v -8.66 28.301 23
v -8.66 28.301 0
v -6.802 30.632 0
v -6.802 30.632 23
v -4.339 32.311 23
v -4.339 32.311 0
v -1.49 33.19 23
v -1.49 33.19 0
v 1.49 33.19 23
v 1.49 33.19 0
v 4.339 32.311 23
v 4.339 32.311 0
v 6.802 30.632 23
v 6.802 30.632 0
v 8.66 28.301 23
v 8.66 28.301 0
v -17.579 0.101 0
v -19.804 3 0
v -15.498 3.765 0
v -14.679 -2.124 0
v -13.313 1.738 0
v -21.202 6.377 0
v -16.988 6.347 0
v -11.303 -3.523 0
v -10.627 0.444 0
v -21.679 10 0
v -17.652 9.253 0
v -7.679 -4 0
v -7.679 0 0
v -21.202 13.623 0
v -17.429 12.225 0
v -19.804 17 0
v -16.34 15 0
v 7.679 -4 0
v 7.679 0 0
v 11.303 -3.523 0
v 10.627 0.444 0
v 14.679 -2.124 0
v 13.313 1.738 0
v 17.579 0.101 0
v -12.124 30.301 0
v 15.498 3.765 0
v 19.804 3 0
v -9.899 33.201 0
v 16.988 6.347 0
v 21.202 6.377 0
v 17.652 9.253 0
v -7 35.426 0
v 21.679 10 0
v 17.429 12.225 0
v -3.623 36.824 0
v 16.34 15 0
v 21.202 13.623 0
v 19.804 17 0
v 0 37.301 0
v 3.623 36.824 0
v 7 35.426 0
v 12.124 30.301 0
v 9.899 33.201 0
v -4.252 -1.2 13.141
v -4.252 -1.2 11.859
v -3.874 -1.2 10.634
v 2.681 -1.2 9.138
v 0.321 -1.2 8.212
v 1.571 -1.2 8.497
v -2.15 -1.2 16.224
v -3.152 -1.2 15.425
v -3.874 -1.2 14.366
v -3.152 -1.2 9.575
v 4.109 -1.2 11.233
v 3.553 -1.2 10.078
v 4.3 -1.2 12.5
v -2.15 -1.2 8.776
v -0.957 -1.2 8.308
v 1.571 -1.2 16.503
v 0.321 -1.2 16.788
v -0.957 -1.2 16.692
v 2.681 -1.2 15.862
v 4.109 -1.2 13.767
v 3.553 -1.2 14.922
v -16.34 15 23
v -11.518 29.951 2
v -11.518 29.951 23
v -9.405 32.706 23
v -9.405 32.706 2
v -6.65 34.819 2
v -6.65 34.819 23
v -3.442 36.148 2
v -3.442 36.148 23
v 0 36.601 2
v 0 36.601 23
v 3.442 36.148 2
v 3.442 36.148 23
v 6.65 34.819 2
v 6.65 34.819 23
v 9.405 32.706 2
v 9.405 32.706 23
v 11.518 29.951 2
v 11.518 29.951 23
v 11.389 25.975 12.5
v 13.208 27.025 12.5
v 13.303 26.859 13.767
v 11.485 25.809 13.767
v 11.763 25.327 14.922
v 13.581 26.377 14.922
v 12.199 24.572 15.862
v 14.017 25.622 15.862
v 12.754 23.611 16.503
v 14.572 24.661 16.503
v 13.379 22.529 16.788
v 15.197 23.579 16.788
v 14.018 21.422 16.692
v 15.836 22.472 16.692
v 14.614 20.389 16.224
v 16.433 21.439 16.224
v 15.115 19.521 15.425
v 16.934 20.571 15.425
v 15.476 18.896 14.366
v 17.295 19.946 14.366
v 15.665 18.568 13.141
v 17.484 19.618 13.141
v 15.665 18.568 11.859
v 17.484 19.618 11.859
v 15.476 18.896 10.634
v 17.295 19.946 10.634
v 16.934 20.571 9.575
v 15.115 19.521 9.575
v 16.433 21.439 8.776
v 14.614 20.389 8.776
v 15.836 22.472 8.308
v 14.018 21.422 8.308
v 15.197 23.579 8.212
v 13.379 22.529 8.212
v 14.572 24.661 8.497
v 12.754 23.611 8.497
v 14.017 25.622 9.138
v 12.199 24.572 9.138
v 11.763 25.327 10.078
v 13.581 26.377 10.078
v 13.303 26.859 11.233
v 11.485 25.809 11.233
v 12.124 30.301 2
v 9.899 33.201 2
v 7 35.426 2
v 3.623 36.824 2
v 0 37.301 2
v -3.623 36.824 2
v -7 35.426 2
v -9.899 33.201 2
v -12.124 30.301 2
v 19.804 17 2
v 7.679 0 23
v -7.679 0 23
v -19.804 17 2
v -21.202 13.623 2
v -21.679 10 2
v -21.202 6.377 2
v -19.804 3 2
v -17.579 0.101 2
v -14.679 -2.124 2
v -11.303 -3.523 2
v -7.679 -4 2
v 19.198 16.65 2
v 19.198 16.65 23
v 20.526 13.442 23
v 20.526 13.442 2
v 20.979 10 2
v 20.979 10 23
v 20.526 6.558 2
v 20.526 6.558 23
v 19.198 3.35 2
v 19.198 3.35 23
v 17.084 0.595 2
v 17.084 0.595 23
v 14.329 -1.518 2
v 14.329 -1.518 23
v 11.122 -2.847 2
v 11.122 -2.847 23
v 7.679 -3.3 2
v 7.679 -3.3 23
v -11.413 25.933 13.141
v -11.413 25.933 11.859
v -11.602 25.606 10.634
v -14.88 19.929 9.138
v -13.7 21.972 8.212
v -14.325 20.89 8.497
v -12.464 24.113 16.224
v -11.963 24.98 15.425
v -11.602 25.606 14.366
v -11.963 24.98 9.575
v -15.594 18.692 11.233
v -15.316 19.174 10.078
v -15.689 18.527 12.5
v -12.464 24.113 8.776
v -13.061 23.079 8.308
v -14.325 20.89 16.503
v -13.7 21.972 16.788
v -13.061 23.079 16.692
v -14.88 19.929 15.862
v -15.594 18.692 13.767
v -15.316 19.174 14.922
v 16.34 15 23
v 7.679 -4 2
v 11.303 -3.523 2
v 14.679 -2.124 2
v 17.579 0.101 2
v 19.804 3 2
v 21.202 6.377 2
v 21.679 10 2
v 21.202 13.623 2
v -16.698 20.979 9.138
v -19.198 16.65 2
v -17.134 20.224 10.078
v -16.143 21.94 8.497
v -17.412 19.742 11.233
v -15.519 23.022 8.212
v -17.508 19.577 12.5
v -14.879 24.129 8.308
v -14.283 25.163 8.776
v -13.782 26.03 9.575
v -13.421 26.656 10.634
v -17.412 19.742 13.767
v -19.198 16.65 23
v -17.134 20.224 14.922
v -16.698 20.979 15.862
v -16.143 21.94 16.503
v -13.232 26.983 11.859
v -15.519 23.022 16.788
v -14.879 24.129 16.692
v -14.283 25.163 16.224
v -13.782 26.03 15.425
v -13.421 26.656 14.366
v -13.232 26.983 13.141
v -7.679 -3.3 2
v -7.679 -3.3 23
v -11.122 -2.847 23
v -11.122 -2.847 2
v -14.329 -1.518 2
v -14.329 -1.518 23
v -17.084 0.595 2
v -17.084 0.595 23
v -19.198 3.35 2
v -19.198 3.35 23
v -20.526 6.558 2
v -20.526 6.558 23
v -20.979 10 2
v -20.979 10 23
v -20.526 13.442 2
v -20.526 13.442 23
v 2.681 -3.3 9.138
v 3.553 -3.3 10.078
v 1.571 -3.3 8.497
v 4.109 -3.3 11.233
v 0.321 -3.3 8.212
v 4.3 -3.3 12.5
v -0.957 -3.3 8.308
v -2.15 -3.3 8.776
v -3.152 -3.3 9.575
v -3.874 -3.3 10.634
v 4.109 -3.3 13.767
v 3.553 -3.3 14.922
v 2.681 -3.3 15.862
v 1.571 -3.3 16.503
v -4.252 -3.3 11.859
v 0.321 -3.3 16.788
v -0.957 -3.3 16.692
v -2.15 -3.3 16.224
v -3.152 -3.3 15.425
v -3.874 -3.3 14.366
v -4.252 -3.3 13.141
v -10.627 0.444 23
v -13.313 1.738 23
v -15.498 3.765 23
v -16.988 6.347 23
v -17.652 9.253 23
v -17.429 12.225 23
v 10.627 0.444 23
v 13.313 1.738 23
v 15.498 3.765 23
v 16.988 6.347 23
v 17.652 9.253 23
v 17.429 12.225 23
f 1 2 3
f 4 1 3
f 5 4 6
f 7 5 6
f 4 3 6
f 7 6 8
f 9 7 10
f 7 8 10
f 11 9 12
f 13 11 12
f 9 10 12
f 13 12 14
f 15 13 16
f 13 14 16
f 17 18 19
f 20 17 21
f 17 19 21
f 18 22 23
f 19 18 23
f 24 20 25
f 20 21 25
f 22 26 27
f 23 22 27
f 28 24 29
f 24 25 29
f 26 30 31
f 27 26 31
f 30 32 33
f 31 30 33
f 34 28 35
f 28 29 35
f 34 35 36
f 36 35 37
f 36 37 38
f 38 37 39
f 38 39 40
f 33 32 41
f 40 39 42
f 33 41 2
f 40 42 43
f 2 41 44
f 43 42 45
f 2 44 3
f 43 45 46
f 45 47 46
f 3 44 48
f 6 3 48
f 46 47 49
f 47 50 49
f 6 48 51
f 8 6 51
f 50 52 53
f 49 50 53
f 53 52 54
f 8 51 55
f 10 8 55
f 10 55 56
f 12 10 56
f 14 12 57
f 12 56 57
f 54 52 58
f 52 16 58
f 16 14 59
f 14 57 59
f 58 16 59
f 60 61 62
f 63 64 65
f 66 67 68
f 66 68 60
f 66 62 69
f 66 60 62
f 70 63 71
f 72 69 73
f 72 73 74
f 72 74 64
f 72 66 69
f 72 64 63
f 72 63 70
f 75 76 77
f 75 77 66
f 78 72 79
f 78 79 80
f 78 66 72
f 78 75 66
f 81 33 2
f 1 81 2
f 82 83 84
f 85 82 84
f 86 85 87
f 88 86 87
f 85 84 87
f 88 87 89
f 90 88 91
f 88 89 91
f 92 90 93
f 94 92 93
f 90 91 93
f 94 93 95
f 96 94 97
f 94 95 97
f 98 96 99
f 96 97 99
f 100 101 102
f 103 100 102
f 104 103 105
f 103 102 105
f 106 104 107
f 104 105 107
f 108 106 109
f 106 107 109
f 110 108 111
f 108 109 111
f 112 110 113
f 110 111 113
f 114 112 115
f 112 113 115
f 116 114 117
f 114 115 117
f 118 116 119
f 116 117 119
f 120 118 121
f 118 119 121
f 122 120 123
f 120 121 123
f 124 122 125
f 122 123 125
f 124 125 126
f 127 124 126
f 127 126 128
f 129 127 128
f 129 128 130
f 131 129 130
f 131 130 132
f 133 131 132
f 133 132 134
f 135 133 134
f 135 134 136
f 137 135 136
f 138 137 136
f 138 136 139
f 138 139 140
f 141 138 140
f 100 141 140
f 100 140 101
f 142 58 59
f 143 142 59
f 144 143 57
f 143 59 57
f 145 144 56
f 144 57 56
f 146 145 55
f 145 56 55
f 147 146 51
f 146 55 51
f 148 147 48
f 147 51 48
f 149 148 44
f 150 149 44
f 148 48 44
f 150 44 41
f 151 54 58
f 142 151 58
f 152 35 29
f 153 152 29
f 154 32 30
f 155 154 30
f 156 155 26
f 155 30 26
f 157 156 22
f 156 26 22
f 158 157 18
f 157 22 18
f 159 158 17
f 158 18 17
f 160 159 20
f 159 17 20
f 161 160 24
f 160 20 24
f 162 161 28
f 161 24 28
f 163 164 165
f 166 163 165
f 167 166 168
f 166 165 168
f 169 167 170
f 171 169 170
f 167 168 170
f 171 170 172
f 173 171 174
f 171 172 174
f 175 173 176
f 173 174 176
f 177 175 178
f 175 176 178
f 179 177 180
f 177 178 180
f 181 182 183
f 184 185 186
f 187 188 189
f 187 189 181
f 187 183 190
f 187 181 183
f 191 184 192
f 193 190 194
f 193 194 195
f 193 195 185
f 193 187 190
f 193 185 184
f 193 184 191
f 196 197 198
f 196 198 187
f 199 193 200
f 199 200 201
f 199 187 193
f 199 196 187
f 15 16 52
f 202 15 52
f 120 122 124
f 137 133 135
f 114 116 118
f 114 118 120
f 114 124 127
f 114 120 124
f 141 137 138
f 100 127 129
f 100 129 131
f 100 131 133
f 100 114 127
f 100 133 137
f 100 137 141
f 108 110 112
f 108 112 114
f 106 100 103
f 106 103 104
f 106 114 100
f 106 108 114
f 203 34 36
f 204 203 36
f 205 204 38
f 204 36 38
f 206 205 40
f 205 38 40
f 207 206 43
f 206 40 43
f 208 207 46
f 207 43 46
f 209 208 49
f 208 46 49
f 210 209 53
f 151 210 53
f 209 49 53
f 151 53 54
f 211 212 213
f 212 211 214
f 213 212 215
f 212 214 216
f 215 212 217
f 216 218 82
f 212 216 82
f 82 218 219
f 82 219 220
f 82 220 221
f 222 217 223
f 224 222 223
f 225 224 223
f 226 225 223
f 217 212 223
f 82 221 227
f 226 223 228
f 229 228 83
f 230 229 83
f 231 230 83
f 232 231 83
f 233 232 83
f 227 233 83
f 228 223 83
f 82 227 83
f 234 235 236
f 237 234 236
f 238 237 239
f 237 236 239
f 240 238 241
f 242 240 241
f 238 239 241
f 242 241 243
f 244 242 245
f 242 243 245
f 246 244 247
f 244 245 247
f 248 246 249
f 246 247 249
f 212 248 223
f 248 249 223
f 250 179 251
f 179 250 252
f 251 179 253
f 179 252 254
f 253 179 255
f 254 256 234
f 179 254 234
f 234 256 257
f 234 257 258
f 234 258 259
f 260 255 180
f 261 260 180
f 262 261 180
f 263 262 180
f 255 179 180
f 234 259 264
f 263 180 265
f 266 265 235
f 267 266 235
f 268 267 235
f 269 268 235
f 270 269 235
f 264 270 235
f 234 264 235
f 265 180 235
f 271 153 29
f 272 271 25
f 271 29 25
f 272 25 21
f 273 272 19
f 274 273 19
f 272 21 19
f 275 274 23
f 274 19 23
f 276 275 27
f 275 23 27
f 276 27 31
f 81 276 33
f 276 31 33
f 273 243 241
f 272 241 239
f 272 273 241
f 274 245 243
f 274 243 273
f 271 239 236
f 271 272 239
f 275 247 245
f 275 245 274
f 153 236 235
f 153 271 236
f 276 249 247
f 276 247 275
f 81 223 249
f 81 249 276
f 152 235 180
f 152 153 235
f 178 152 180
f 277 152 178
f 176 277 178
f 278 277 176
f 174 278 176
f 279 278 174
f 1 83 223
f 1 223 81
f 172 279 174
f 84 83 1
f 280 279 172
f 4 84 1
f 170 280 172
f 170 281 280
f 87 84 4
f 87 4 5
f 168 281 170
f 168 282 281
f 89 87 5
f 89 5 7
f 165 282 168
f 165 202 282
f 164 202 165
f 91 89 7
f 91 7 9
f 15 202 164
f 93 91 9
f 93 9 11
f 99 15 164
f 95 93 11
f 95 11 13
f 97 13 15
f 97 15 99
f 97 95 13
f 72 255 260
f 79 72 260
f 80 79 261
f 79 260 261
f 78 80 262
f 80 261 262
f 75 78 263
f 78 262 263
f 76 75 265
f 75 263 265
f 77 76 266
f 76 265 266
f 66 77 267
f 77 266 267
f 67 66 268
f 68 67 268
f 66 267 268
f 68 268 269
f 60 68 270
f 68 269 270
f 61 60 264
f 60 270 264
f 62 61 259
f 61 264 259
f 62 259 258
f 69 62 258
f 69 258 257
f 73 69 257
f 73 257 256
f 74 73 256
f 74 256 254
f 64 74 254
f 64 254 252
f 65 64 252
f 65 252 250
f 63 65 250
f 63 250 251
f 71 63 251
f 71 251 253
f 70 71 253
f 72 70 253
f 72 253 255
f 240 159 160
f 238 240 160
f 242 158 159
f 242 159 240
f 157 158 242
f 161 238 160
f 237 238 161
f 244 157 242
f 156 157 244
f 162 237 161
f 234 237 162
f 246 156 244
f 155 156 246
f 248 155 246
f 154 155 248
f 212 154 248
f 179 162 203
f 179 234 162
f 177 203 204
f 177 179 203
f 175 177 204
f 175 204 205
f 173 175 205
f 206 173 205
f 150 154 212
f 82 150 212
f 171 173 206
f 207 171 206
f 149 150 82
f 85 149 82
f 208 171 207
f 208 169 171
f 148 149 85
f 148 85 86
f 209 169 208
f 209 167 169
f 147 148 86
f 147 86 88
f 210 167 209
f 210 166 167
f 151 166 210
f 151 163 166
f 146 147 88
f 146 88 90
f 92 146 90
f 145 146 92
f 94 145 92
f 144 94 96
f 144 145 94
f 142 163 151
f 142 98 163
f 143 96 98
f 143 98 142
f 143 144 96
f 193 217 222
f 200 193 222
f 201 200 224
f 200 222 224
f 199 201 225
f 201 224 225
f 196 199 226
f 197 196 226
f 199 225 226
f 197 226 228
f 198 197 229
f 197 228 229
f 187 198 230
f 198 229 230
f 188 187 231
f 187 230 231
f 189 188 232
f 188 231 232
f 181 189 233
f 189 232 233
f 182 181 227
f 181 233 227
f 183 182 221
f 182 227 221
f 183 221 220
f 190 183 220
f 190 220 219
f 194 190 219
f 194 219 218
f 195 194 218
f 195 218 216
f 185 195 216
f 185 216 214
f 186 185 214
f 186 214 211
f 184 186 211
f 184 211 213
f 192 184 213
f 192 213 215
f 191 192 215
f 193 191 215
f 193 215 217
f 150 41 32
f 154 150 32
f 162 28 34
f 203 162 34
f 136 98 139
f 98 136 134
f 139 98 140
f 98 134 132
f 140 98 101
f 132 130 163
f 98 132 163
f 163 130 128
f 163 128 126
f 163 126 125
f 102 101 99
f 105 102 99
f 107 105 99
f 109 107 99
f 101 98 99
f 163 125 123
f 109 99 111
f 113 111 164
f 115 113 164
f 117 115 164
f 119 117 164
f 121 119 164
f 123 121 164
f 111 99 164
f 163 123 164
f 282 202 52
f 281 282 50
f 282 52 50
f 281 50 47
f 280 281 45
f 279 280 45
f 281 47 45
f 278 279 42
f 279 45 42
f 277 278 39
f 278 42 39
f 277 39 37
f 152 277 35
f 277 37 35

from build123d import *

# Parameters (mm, degrees)
F1_DEPTH        = 25
F3_START        = -0.65
F2_R            = 4.3
F3_DEPTH        = 2.15
F3_COPIES_COUNT = 3
F6_R            = 33.7024135389
F7_DEPTH        = 2
F9_DEPTH        = 21


# Not quite as in the source:
# - a pattern or mirror of a feature is missing from the dataset's text; its kind, count and spacing are read off the source's solid


with BuildPart() as f1:
    # F0 (on Top) → F1 (new body)
    with BuildSketch(Plane.XY):
        with BuildLine():
            ThreePointArc((7.6794919243, -4), (19.8038475773, 3), (19.8038475773, 17))
            Line((19.8038475773, 17), (12.124355653, 30.3012701892))
            ThreePointArc((12.124355653, 30.3012701892), (0, 37.3012701892), (-12.124355653, 30.3012701892))
            Line((-12.124355653, 30.3012701892), (-19.8038475773, 17))
            ThreePointArc((-19.8038475773, 17), (-19.8038475773, 3), (-7.6794919243, -4))
            Line((-7.6794919243, -4), (0, -4))
            Line((0, -4), (7.6794919243, -4))
        make_face()
        with BuildLine():
            Line((7.6794919243, 0), (0, 0))
            Line((0, 0), (-7.6794919243, 0))
            ThreePointArc((-7.6794919243, 0), (-16.3397459622, 5), (-16.3397459622, 15))
            Line((-16.3397459622, 15), (-8.6602540378, 28.3012701892))
            ThreePointArc((-8.6602540378, 28.3012701892), (0, 33.3012701892), (8.6602540378, 28.3012701892))
            Line((8.6602540378, 28.3012701892), (16.3397459622, 15))
            ThreePointArc((16.3397459622, 15), (16.3397459622, 5), (7.6794919243, 0))
        make_face(mode=Mode.SUBTRACT)
    extrude(amount=F1_DEPTH)

    # F2 (on face) → F3 (cut)
    with BuildSketch(Plane(origin=(-22.2141016151, 12.8253175473, 0), x_dir=(-0.5, -0.8660254038, 0), z_dir=(-0.8660254038, 0.5, 0)).offset(F3_START)):
        with Locations((-12.5, 12.5)):
            Circle(F2_R)
    f3 = extrude(amount=-F3_DEPTH, mode=Mode.SUBTRACT)

    # F3_copies: F3 ×3 about axis
    f3_copies_axis = Axis((0, 14.433757, 0), (0, 0, 1))
    for i in range(1, F3_COPIES_COUNT):
        add(f3.rotate(f3_copies_axis, i * 360 / F3_COPIES_COUNT), mode=Mode.SUBTRACT)

    # F6 (on face) → F7 (cut)
    with BuildSketch(Plane.XY.offset(25)):
        with Locations((0, 15.2027085423)):
            Circle(F6_R)
    extrude(amount=-F7_DEPTH, mode=Mode.SUBTRACT)

    # F8 (on face) → F9 (cut)
    with BuildSketch(Plane.XY.offset(23)):
        with BuildLine():
            Line((-12.124355653, 30.3012701892), (-19.8038475773, 17))
            ThreePointArc((-19.8038475773, 17), (-19.8038475773, 3), (-7.6794919243, -4))
            Line((-7.6794919243, -4), (7.6794919243, -4))
            ThreePointArc((7.6794919243, -4), (19.8038475773, 3), (19.8038475773, 17))
            Line((19.8038475773, 17), (12.124355653, 30.3012701892))
            ThreePointArc((12.124355653, 30.3012701892), (0, 37.3012701892), (-12.124355653, 30.3012701892))
        make_face()
        with BuildLine():
            ThreePointArc((-11.5181378703, 29.9512701892), (0, 36.6012701892), (11.5181378703, 29.9512701892))
            Line((11.5181378703, 29.9512701892), (19.1976297946, 16.65))
            ThreePointArc((19.1976297946, 16.65), (19.1976297946, 3.35), (7.6794919243, -3.3))
            Line((7.6794919243, -3.3), (-7.6794919243, -3.3))
            ThreePointArc((-7.6794919243, -3.3), (-19.1976297946, 3.35), (-19.1976297946, 16.65))
            Line((-19.1976297946, 16.65), (-11.5181378703, 29.9512701892))
        make_face(mode=Mode.SUBTRACT)
    extrude(amount=-F9_DEPTH, mode=Mode.SUBTRACT)


solid = f1.part
